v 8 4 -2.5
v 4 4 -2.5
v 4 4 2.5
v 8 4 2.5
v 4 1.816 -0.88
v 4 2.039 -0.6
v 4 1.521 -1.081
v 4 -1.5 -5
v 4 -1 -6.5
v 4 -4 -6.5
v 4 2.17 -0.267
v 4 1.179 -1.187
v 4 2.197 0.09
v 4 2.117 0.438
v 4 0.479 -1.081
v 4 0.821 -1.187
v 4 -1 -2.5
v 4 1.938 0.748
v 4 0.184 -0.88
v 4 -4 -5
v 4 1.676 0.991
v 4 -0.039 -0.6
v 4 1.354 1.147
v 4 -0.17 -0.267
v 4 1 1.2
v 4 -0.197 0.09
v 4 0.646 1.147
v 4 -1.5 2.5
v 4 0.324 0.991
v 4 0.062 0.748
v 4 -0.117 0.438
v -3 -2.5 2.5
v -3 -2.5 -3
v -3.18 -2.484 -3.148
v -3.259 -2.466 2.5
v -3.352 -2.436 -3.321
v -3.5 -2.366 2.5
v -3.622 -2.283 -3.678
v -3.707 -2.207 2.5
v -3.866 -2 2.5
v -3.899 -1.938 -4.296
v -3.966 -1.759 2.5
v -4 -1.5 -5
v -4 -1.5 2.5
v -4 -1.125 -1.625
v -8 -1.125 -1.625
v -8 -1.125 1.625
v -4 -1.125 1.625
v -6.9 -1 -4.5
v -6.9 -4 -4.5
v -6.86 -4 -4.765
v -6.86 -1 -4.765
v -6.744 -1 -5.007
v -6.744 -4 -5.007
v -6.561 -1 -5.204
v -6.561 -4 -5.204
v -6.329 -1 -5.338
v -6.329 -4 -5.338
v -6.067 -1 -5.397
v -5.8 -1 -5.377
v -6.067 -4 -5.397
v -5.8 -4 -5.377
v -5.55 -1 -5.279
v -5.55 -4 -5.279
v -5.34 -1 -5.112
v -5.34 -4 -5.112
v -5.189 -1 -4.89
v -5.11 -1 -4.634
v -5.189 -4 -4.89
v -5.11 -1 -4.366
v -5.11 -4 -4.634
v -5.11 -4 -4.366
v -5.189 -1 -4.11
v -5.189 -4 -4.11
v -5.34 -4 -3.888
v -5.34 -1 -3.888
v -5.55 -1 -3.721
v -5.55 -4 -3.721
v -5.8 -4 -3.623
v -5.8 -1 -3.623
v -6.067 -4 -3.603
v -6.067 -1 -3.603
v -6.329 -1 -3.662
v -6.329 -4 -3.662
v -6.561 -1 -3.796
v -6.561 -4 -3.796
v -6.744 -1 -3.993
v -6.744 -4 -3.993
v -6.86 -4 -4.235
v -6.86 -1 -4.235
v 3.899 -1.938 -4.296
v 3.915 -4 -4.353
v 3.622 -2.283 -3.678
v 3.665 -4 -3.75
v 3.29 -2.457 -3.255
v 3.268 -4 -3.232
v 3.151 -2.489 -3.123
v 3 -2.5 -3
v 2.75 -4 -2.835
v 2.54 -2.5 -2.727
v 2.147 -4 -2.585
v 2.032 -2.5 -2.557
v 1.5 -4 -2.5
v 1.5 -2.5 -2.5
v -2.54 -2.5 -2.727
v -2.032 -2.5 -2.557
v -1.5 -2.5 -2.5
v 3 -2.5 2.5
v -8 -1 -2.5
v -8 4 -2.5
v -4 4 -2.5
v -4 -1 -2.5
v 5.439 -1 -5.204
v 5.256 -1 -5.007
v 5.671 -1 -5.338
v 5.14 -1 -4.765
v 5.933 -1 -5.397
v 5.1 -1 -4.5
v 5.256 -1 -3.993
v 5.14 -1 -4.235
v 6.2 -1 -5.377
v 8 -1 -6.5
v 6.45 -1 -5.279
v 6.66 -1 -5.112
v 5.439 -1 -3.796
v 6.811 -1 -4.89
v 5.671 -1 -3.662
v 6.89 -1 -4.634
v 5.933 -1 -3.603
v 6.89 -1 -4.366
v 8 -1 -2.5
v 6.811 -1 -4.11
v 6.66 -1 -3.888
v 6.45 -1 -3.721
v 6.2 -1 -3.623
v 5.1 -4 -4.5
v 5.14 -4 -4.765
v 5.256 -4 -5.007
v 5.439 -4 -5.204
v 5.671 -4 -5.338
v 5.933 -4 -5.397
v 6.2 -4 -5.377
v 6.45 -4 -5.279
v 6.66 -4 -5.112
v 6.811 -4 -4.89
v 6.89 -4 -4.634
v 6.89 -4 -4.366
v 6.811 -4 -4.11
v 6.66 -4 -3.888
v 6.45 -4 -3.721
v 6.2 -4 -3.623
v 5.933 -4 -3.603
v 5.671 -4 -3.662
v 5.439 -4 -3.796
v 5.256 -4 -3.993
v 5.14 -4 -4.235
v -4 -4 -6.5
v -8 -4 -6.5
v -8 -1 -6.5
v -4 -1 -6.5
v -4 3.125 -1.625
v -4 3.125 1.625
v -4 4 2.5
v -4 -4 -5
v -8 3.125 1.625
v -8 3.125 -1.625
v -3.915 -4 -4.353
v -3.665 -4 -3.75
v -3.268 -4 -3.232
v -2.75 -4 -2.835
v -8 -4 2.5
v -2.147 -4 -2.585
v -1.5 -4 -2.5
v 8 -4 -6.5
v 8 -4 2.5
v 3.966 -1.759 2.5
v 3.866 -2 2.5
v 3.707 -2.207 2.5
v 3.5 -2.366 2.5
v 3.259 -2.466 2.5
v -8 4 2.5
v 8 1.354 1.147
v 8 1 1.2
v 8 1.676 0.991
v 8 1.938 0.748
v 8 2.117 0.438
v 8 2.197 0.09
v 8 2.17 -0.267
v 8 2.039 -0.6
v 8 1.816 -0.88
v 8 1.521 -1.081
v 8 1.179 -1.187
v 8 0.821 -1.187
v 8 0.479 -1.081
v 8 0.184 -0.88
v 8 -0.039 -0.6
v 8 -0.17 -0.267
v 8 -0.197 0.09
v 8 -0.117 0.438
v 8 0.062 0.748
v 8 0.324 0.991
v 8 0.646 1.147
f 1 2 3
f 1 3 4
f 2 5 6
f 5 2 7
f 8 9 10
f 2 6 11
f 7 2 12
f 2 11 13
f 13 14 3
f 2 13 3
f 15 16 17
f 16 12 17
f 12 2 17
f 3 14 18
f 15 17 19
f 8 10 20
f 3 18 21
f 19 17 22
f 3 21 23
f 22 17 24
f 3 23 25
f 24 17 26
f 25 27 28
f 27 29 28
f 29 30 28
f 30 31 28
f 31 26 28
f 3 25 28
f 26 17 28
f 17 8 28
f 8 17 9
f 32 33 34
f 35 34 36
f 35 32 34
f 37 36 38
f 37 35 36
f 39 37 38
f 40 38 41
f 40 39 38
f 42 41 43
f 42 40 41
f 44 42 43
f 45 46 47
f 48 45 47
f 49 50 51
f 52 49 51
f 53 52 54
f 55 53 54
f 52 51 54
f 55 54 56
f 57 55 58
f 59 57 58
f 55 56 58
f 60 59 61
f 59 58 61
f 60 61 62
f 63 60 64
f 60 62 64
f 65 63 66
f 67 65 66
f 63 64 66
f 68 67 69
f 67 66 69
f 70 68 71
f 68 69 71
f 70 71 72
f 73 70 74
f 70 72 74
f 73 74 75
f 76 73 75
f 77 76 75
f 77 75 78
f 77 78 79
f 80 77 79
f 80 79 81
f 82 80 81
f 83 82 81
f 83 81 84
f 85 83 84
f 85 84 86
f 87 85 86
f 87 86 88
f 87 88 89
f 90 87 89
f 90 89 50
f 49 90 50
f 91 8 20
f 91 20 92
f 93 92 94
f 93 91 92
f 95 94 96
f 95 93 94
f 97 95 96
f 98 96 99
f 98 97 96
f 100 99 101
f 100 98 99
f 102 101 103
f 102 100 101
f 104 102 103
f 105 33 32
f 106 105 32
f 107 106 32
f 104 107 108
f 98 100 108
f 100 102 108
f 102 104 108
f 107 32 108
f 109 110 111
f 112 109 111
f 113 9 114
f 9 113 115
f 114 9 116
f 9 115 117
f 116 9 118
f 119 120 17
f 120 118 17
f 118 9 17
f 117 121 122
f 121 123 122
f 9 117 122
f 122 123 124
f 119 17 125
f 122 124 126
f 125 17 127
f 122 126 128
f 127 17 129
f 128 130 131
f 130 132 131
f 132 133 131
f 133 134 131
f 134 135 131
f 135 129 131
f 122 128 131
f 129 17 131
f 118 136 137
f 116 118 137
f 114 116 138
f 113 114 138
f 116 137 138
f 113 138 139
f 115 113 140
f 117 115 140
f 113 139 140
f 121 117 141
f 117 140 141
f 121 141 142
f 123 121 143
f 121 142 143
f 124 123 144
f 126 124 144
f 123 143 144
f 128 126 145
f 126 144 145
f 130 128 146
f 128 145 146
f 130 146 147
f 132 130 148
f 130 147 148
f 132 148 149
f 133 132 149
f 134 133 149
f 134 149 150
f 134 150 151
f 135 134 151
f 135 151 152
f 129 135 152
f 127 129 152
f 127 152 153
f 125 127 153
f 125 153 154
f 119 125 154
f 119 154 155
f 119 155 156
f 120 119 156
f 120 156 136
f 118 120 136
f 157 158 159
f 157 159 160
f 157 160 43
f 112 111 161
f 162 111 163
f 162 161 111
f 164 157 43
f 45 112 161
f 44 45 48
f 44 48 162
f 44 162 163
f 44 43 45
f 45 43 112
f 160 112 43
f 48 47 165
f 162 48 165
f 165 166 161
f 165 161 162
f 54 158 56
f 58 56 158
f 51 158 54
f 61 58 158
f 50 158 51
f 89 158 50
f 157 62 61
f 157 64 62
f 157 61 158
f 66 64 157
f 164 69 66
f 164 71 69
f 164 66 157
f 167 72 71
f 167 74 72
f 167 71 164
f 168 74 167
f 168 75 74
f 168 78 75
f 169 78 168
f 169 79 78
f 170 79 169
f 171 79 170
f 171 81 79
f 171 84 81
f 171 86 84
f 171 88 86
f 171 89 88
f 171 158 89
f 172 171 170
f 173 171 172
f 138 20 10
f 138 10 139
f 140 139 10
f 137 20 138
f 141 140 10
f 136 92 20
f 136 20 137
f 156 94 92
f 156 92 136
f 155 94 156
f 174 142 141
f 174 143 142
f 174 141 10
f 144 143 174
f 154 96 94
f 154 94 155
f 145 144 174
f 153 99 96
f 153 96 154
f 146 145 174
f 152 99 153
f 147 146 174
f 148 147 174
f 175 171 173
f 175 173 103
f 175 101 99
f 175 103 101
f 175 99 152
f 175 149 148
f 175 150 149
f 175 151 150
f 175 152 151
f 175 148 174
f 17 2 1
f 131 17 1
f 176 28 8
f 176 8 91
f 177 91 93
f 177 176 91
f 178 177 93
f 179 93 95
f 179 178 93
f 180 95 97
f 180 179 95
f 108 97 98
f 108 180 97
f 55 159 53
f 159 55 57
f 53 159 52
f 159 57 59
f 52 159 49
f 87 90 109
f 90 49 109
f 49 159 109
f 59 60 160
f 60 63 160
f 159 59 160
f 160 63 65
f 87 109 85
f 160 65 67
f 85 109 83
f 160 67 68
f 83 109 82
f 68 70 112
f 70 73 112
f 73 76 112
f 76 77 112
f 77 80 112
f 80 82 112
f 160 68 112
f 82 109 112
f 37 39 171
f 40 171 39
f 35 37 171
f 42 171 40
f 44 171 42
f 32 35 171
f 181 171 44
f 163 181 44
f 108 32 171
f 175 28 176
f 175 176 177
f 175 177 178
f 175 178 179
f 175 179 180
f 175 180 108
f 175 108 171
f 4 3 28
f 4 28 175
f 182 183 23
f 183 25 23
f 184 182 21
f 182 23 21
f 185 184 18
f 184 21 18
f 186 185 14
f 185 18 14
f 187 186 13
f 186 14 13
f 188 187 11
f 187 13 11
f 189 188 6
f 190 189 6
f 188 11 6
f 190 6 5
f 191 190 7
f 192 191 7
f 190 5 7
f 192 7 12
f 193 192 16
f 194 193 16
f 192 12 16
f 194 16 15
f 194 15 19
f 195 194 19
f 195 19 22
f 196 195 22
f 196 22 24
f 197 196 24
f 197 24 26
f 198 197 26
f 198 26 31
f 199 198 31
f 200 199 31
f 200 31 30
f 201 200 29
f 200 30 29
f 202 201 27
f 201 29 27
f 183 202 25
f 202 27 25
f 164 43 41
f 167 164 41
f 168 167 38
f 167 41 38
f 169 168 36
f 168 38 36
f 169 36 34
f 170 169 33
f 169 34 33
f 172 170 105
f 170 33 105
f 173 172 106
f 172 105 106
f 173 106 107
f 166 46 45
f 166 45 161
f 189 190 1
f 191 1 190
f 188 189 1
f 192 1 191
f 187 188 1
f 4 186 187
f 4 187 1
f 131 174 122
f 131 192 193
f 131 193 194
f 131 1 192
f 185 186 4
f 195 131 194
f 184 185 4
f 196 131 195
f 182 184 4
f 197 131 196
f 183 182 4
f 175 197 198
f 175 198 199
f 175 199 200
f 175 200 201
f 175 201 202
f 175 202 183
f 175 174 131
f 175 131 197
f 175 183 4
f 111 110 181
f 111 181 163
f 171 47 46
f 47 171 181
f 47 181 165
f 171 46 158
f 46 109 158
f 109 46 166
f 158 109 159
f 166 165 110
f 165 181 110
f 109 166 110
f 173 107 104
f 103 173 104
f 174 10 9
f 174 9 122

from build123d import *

# Parameters (mm, degrees)
SKETCH1_W                  = 16
SKETCH1_H                  = 5
BOSS_EXTRUDE1_DEPTH        = 4
SKETCH2_W                  = 8
SKETCH2_H                  = 5
CUT_EXTRUDE1_DEPTH         = 6.5
SKETCH3_W                  = 3.25
SKETCH3_H                  = 4.25
CUT_EXTRUDE2_DEPTH         = 4
M2_CLEARANCE_HOLE2_D       = 2.4
M2_CLEARANCE_HOLE2_DEPTH   = 4
M2_CLEARANCE_HOLE2_TIP     = 0.721032743
SKETCH10_W                 = 4
SKETCH10_H                 = 4
BOSS_EXTRUDE2_DEPTH        = 3
M1_6_CLEARANCE_HOLE1_D     = 1.8
M1_6_CLEARANCE_HOLE1_DEPTH = 4
M1_6_CLEARANCE_HOLE1_TIP   = 0.540774557
FILLET1_R                  = 1
FILLET2_R                  = 2.5


with BuildPart() as part:
    # Sketch1 → Boss-Extrude1 (new, symmetric)
    with BuildSketch(Plane(origin=(0, 0, 0), x_dir=(1, 0, 0), z_dir=(0, 1, 0))):
        Rectangle(SKETCH1_W, SKETCH1_H)
    extrude(amount=BOSS_EXTRUDE1_DEPTH, both=True)

    # Sketch2 → Cut-Extrude1 (cut)
    with BuildSketch(Plane(origin=(0, 4, 5), x_dir=(1, 0, 0), z_dir=(0, -1, 0))):
        with Locations((0, -5)):
            Rectangle(SKETCH2_W, SKETCH2_H)
    extrude(amount=CUT_EXTRUDE1_DEPTH, mode=Mode.SUBTRACT)

    # Sketch3 → Cut-Extrude2 (cut)
    with BuildSketch(Plane.ZY.offset(8)):
        with Locations((0, 1)):
            Rectangle(SKETCH3_W, SKETCH3_H)
    extrude(amount=-CUT_EXTRUDE2_DEPTH, mode=Mode.SUBTRACT)

    # M2 Clearance Hole2
    with Locations(Plane(origin=(8, 0, 0), x_dir=(0, 0, -1), z_dir=(1, 0, 0))):
        with Locations((0, 1)):
            Hole(M2_CLEARANCE_HOLE2_D / 2, depth=M2_CLEARANCE_HOLE2_DEPTH)
            with Locations((0, 0, -(M2_CLEARANCE_HOLE2_DEPTH + M2_CLEARANCE_HOLE2_TIP / 2))):  # 118° drill point
                Cone(0, M2_CLEARANCE_HOLE2_D / 2, M2_CLEARANCE_HOLE2_TIP, mode=Mode.SUBTRACT)

    # Sketch10 → Boss-Extrude2 (add)
    with BuildSketch(Plane.XZ.offset(4)):
        with Locations((6, -4.5)):
            Rectangle(SKETCH10_W, SKETCH10_H)
        with Locations((-6, -4.5)):
            Rectangle(SKETCH10_W, SKETCH10_H)
    extrude(amount=-BOSS_EXTRUDE2_DEPTH)

    # M1.6 Clearance Hole1
    with Locations(Plane(origin=(0, -1, 0), x_dir=(1, 0, 0), z_dir=(0, 1, 0))):
        with Locations((6, 4.5), (-6, 4.5)):
            Hole(M1_6_CLEARANCE_HOLE1_D / 2, depth=M1_6_CLEARANCE_HOLE1_DEPTH)
            with Locations((0, 0, -(M1_6_CLEARANCE_HOLE1_DEPTH + M1_6_CLEARANCE_HOLE1_TIP / 2))):  # 118° drill point
                Cone(0, M1_6_CLEARANCE_HOLE1_D / 2, M1_6_CLEARANCE_HOLE1_TIP, mode=Mode.SUBTRACT)

    # Fillet1
    fillet1_edges = [part.edges().sort_by_distance(p)[0] for p in [
        (4, -2.5, 0),
        (-4, -2.5, 0),
    ]]
    fillet(fillet1_edges, radius=FILLET1_R)

    # Fillet2
    fillet2_edges = [part.edges().sort_by_distance(p)[0] for p in [
        (-4, -2.75, -2.5),
        (4, -2.75, -2.5),
    ]]
    fillet(fillet2_edges, radius=FILLET2_R)


solid = part.part
